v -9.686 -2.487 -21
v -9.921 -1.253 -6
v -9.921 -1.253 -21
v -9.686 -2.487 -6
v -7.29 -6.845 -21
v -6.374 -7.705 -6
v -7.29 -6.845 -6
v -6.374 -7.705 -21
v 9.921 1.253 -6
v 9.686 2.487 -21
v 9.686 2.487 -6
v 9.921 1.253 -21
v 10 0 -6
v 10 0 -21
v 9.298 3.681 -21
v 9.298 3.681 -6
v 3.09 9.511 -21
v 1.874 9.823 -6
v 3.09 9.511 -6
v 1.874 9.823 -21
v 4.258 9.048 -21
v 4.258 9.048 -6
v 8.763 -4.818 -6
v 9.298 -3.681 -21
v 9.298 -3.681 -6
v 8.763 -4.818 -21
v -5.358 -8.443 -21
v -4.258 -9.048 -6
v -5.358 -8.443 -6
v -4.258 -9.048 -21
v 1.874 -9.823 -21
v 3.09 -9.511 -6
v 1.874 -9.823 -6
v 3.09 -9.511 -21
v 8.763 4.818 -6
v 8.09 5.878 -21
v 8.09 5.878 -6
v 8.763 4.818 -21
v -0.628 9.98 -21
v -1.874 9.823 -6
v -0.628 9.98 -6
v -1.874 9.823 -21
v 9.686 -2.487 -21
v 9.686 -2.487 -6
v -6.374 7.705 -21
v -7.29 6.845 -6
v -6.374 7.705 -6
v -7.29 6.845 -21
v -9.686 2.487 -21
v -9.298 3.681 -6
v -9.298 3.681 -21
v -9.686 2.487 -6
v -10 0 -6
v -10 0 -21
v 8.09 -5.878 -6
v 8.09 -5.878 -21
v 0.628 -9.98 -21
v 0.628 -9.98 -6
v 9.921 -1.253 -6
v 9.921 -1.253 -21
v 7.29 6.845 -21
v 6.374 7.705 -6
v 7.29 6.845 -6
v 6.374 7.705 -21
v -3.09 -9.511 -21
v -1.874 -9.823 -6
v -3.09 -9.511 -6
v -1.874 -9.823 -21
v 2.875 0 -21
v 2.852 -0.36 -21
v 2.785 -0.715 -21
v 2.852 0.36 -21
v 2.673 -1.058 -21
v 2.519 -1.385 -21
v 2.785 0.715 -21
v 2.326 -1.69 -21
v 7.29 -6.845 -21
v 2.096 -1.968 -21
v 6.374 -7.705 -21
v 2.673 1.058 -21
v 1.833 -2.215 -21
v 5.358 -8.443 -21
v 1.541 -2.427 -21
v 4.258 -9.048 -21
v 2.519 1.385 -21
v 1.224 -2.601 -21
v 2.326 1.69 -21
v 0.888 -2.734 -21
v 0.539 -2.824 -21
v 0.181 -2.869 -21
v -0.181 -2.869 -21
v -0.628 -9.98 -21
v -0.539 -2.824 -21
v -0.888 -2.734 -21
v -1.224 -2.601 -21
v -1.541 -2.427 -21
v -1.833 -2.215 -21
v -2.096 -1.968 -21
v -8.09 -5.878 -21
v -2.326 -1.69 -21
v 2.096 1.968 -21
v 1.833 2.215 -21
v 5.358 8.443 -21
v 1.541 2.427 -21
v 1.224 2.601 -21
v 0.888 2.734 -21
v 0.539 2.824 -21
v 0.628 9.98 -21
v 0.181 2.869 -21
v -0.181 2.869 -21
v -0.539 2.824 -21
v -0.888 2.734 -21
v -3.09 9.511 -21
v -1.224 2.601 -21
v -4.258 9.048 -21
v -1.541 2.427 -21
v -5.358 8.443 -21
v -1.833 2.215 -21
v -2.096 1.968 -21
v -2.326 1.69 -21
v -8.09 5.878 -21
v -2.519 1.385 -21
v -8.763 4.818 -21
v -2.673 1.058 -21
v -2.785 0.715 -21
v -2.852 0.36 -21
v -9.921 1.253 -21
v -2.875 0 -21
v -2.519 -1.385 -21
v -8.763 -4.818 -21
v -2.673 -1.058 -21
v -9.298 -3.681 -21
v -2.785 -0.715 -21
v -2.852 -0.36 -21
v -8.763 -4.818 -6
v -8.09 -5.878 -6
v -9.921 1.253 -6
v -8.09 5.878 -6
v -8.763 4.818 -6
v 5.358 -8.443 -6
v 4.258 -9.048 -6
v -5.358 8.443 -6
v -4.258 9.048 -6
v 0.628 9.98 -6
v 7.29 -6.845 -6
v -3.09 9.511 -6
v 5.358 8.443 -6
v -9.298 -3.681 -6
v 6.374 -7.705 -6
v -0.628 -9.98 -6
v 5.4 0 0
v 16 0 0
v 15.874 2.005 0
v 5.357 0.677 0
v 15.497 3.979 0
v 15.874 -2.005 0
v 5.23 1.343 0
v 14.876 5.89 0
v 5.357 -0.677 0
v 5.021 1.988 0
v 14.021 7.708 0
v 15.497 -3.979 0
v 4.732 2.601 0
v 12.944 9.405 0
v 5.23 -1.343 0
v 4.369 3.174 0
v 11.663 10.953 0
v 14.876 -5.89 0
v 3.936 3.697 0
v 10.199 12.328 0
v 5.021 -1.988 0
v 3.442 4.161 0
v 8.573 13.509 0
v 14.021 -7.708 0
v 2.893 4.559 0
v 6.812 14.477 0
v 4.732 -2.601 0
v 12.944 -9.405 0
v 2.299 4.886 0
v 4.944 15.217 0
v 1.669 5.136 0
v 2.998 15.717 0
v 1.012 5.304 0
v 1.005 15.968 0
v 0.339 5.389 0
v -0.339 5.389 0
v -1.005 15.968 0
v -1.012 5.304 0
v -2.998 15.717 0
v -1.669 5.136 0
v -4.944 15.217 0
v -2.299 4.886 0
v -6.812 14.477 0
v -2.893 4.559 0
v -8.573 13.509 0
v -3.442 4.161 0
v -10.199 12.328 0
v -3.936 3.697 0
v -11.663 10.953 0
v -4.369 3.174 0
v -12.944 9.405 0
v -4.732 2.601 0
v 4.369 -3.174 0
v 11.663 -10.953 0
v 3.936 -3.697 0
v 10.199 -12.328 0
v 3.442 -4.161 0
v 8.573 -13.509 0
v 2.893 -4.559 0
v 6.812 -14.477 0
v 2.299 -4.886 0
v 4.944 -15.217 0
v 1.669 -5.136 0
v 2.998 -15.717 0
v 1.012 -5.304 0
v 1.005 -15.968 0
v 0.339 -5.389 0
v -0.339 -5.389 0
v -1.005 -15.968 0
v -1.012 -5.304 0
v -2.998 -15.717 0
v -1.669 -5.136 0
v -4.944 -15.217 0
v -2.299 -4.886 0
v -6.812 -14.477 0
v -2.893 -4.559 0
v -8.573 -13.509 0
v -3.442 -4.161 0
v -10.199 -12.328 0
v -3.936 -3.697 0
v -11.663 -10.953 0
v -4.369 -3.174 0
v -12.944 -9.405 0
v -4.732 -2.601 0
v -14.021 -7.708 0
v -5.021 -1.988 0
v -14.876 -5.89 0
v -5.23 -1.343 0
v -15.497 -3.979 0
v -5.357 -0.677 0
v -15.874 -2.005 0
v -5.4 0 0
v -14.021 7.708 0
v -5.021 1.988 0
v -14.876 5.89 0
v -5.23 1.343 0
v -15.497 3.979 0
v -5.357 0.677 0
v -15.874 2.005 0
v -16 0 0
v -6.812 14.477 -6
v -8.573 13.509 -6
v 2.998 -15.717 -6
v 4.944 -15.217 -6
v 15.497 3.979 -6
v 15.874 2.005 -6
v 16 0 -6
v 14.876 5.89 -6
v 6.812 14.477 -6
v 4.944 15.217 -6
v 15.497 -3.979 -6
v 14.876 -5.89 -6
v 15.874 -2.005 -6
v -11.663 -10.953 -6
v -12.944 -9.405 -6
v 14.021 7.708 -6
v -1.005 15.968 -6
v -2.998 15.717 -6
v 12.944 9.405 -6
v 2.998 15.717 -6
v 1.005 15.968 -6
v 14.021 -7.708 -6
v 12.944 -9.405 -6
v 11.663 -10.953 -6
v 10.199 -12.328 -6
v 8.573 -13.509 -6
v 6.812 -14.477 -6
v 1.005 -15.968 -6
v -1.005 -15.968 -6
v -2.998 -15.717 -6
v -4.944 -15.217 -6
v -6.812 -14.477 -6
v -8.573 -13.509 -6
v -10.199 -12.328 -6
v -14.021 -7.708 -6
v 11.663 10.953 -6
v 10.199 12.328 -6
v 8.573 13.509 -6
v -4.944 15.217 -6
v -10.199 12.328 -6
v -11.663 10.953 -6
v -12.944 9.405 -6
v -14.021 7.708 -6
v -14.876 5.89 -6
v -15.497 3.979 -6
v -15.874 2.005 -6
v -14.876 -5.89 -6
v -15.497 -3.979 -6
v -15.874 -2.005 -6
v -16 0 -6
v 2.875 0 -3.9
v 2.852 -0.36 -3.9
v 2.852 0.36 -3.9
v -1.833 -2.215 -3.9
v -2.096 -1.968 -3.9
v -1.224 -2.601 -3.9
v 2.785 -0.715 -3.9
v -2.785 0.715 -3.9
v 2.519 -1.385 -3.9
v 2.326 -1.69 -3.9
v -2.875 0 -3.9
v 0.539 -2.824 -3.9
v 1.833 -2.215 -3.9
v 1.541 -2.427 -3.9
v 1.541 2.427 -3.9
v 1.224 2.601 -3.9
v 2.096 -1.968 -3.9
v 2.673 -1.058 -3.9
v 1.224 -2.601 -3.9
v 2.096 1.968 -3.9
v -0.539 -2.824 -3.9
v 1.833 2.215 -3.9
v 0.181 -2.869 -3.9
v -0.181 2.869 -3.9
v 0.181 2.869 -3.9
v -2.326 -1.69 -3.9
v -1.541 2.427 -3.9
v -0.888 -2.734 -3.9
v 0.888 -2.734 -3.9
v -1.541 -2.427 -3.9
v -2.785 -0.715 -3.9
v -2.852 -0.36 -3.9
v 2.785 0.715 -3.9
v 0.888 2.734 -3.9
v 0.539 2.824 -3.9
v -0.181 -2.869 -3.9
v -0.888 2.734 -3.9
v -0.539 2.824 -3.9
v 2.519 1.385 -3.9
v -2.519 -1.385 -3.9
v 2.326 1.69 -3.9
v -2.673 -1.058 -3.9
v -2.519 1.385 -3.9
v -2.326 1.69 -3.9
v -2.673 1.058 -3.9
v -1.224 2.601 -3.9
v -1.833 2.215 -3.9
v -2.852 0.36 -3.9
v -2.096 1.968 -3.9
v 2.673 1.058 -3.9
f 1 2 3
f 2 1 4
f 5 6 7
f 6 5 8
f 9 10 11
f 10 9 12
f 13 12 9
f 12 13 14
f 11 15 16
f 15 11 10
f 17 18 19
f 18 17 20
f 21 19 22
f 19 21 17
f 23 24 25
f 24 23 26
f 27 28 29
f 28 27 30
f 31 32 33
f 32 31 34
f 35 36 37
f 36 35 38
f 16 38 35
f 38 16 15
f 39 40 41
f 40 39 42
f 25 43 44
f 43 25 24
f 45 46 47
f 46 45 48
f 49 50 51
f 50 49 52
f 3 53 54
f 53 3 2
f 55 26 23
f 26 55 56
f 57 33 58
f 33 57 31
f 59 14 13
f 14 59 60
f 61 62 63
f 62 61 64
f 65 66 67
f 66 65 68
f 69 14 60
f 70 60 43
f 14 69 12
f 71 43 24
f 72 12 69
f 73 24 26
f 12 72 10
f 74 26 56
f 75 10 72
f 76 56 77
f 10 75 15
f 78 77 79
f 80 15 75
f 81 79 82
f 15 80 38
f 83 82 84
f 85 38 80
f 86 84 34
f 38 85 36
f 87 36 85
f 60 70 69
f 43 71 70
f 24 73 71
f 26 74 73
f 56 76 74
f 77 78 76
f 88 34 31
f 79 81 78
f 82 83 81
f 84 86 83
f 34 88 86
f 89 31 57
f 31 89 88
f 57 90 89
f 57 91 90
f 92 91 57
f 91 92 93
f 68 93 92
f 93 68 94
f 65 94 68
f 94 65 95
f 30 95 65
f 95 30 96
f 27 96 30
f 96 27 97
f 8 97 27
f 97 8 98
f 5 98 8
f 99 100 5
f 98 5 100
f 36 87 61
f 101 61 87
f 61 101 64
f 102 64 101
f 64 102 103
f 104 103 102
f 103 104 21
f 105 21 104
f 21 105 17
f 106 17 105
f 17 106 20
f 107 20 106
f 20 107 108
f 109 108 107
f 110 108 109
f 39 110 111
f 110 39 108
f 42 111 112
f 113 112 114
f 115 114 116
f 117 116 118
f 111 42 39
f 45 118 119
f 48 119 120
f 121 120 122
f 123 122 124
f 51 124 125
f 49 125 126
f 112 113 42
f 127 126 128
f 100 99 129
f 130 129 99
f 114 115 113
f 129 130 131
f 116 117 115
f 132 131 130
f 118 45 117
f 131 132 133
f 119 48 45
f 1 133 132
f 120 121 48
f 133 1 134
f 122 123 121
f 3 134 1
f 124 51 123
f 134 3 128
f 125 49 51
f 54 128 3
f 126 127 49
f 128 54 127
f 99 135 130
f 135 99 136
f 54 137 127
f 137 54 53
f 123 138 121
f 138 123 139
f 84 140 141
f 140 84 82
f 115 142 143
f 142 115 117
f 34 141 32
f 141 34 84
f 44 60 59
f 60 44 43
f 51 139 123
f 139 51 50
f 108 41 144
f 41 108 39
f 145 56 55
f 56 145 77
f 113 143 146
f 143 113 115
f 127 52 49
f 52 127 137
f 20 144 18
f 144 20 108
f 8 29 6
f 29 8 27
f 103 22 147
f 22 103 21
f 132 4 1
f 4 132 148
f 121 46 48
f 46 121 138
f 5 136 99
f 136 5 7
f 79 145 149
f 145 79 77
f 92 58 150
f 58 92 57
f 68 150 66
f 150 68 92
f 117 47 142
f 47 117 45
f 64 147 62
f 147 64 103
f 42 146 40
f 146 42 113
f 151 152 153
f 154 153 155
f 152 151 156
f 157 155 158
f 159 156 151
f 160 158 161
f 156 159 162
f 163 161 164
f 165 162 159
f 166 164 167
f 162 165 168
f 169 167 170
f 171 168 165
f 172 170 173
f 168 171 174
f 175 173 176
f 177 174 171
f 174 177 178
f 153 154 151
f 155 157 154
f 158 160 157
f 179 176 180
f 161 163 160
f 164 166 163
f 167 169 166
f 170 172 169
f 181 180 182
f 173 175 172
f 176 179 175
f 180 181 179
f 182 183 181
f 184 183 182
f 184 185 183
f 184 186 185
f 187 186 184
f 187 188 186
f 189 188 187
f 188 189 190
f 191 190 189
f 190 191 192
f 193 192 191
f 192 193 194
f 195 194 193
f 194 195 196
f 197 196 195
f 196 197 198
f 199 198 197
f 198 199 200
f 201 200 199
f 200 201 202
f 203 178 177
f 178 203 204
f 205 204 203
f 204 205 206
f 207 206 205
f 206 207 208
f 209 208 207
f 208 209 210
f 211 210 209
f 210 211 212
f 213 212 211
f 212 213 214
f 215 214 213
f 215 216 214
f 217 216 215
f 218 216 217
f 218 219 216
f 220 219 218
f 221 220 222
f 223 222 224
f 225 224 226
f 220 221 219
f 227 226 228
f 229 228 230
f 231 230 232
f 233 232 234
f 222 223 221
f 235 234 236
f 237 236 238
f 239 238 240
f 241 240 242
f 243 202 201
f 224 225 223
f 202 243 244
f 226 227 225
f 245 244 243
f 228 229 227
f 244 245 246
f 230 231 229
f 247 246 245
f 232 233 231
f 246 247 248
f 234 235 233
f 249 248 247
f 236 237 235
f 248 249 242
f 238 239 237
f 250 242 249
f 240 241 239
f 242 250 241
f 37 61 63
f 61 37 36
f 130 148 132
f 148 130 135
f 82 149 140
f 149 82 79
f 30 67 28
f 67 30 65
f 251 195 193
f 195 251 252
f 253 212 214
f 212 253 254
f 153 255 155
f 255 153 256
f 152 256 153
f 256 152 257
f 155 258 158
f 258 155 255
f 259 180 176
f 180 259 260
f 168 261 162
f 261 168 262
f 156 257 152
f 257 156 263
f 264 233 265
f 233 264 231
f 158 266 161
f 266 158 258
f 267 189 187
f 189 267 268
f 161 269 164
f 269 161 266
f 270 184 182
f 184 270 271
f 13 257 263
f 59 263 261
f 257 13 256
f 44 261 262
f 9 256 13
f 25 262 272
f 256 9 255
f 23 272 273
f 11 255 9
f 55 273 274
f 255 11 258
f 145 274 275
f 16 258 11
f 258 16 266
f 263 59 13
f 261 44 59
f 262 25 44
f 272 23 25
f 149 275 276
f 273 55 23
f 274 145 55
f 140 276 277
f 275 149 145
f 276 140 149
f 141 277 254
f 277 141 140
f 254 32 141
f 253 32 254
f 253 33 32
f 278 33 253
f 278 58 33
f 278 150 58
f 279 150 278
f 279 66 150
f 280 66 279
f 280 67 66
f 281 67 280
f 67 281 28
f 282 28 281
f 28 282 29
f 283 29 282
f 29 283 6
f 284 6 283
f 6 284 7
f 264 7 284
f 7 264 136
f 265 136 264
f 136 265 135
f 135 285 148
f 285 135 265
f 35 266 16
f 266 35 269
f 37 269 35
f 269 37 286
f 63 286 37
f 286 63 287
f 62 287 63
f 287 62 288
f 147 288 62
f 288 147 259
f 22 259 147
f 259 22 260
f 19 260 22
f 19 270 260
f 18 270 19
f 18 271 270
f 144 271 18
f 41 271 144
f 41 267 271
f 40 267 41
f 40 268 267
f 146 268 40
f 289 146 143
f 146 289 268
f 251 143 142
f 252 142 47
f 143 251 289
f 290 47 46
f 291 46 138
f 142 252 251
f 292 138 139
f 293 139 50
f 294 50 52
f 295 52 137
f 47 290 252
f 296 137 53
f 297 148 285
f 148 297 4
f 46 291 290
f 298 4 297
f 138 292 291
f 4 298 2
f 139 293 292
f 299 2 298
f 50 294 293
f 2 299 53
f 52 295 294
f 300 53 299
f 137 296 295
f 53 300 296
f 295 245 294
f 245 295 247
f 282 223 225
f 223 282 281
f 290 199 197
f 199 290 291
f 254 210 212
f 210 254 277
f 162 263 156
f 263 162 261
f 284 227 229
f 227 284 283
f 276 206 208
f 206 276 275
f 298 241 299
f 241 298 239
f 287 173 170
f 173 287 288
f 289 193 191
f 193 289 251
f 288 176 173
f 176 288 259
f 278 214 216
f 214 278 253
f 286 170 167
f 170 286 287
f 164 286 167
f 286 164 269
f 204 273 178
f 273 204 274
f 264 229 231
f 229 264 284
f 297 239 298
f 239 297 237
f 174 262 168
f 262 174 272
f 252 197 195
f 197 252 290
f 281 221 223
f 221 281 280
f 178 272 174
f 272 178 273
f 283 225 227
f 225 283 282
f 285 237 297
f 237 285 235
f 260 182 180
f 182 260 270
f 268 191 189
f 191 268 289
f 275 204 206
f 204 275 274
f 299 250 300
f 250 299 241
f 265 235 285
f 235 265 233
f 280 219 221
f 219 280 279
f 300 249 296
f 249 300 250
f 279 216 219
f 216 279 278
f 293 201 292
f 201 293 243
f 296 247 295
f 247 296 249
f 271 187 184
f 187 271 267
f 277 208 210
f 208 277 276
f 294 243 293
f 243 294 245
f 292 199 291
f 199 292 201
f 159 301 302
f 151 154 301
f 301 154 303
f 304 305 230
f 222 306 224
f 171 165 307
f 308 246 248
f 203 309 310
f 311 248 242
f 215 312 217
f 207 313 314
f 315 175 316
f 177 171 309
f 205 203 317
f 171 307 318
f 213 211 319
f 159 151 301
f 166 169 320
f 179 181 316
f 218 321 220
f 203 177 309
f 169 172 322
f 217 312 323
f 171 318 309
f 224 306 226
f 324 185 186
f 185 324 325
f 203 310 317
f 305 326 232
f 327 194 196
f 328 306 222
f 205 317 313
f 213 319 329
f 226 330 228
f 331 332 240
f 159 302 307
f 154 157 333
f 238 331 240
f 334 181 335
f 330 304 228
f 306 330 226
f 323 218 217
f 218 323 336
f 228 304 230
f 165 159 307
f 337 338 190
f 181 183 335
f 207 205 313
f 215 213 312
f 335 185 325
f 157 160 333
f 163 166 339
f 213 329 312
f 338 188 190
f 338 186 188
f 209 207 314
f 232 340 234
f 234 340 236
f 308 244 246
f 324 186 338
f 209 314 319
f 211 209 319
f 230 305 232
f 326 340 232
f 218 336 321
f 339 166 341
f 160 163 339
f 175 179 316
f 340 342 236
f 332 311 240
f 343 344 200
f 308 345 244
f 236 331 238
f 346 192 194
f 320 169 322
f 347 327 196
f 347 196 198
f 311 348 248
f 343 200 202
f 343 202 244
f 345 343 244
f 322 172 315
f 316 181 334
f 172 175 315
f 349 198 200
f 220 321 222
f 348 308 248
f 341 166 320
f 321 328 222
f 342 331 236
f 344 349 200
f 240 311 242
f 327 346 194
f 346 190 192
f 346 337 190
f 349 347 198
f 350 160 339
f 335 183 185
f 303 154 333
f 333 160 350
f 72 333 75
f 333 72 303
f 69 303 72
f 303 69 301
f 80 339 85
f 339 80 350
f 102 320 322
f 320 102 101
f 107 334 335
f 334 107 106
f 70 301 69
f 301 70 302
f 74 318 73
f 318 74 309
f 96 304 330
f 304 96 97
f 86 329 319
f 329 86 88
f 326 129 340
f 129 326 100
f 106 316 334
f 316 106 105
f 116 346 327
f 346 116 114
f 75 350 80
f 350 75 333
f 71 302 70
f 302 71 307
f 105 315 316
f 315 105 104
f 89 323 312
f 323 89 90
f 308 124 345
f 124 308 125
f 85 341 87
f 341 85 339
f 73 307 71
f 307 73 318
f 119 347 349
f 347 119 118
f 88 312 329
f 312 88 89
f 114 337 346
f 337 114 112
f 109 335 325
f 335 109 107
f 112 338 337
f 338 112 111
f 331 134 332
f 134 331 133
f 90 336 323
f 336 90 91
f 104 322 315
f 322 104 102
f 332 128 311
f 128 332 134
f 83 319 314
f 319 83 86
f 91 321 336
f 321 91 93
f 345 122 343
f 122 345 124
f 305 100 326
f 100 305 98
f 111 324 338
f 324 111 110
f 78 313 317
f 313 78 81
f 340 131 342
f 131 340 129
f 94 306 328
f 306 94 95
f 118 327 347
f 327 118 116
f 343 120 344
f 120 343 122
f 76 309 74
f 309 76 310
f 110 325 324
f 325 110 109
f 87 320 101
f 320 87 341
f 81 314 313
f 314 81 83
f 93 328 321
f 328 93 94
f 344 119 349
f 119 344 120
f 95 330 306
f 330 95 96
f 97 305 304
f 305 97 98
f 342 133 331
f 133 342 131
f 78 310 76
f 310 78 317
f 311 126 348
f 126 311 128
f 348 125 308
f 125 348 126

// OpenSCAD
$fn = 50;


difference() {
	union() {
		translate(v = [0, 0, -21.0000000000]) {
			cylinder(h = 21, r = 10.0000000000);
		}
		translate(v = [0, 0, -6.0000000000]) {
			cylinder(h = 6, r = 16.0000000000);
		}
	}
	union() {
		translate(v = [0, 0, 0]) {
			rotate(a = [0, 0, 0]) {
				difference() {
					union() {
						#translate(v = [0, 0, -21.0000000000]) {
							cylinder(h = 21, r = 2.6000000000);
						}
						#translate(v = [0, 0, -3.9000000000]) {
							cylinder(h = 3.9000000000, r1 = 2.8750000000, r2 = 5.4000000000);
						}
						#translate(v = [0, 0, -21.0000000000]) {
							cylinder(h = 21, r = 2.8750000000);
						}
						#translate(v = [0, 0, -21.0000000000]) {
							cylinder(h = 21, r = 2.6000000000);
						}
					}
					union();
				}
			}
		}
	}
}
